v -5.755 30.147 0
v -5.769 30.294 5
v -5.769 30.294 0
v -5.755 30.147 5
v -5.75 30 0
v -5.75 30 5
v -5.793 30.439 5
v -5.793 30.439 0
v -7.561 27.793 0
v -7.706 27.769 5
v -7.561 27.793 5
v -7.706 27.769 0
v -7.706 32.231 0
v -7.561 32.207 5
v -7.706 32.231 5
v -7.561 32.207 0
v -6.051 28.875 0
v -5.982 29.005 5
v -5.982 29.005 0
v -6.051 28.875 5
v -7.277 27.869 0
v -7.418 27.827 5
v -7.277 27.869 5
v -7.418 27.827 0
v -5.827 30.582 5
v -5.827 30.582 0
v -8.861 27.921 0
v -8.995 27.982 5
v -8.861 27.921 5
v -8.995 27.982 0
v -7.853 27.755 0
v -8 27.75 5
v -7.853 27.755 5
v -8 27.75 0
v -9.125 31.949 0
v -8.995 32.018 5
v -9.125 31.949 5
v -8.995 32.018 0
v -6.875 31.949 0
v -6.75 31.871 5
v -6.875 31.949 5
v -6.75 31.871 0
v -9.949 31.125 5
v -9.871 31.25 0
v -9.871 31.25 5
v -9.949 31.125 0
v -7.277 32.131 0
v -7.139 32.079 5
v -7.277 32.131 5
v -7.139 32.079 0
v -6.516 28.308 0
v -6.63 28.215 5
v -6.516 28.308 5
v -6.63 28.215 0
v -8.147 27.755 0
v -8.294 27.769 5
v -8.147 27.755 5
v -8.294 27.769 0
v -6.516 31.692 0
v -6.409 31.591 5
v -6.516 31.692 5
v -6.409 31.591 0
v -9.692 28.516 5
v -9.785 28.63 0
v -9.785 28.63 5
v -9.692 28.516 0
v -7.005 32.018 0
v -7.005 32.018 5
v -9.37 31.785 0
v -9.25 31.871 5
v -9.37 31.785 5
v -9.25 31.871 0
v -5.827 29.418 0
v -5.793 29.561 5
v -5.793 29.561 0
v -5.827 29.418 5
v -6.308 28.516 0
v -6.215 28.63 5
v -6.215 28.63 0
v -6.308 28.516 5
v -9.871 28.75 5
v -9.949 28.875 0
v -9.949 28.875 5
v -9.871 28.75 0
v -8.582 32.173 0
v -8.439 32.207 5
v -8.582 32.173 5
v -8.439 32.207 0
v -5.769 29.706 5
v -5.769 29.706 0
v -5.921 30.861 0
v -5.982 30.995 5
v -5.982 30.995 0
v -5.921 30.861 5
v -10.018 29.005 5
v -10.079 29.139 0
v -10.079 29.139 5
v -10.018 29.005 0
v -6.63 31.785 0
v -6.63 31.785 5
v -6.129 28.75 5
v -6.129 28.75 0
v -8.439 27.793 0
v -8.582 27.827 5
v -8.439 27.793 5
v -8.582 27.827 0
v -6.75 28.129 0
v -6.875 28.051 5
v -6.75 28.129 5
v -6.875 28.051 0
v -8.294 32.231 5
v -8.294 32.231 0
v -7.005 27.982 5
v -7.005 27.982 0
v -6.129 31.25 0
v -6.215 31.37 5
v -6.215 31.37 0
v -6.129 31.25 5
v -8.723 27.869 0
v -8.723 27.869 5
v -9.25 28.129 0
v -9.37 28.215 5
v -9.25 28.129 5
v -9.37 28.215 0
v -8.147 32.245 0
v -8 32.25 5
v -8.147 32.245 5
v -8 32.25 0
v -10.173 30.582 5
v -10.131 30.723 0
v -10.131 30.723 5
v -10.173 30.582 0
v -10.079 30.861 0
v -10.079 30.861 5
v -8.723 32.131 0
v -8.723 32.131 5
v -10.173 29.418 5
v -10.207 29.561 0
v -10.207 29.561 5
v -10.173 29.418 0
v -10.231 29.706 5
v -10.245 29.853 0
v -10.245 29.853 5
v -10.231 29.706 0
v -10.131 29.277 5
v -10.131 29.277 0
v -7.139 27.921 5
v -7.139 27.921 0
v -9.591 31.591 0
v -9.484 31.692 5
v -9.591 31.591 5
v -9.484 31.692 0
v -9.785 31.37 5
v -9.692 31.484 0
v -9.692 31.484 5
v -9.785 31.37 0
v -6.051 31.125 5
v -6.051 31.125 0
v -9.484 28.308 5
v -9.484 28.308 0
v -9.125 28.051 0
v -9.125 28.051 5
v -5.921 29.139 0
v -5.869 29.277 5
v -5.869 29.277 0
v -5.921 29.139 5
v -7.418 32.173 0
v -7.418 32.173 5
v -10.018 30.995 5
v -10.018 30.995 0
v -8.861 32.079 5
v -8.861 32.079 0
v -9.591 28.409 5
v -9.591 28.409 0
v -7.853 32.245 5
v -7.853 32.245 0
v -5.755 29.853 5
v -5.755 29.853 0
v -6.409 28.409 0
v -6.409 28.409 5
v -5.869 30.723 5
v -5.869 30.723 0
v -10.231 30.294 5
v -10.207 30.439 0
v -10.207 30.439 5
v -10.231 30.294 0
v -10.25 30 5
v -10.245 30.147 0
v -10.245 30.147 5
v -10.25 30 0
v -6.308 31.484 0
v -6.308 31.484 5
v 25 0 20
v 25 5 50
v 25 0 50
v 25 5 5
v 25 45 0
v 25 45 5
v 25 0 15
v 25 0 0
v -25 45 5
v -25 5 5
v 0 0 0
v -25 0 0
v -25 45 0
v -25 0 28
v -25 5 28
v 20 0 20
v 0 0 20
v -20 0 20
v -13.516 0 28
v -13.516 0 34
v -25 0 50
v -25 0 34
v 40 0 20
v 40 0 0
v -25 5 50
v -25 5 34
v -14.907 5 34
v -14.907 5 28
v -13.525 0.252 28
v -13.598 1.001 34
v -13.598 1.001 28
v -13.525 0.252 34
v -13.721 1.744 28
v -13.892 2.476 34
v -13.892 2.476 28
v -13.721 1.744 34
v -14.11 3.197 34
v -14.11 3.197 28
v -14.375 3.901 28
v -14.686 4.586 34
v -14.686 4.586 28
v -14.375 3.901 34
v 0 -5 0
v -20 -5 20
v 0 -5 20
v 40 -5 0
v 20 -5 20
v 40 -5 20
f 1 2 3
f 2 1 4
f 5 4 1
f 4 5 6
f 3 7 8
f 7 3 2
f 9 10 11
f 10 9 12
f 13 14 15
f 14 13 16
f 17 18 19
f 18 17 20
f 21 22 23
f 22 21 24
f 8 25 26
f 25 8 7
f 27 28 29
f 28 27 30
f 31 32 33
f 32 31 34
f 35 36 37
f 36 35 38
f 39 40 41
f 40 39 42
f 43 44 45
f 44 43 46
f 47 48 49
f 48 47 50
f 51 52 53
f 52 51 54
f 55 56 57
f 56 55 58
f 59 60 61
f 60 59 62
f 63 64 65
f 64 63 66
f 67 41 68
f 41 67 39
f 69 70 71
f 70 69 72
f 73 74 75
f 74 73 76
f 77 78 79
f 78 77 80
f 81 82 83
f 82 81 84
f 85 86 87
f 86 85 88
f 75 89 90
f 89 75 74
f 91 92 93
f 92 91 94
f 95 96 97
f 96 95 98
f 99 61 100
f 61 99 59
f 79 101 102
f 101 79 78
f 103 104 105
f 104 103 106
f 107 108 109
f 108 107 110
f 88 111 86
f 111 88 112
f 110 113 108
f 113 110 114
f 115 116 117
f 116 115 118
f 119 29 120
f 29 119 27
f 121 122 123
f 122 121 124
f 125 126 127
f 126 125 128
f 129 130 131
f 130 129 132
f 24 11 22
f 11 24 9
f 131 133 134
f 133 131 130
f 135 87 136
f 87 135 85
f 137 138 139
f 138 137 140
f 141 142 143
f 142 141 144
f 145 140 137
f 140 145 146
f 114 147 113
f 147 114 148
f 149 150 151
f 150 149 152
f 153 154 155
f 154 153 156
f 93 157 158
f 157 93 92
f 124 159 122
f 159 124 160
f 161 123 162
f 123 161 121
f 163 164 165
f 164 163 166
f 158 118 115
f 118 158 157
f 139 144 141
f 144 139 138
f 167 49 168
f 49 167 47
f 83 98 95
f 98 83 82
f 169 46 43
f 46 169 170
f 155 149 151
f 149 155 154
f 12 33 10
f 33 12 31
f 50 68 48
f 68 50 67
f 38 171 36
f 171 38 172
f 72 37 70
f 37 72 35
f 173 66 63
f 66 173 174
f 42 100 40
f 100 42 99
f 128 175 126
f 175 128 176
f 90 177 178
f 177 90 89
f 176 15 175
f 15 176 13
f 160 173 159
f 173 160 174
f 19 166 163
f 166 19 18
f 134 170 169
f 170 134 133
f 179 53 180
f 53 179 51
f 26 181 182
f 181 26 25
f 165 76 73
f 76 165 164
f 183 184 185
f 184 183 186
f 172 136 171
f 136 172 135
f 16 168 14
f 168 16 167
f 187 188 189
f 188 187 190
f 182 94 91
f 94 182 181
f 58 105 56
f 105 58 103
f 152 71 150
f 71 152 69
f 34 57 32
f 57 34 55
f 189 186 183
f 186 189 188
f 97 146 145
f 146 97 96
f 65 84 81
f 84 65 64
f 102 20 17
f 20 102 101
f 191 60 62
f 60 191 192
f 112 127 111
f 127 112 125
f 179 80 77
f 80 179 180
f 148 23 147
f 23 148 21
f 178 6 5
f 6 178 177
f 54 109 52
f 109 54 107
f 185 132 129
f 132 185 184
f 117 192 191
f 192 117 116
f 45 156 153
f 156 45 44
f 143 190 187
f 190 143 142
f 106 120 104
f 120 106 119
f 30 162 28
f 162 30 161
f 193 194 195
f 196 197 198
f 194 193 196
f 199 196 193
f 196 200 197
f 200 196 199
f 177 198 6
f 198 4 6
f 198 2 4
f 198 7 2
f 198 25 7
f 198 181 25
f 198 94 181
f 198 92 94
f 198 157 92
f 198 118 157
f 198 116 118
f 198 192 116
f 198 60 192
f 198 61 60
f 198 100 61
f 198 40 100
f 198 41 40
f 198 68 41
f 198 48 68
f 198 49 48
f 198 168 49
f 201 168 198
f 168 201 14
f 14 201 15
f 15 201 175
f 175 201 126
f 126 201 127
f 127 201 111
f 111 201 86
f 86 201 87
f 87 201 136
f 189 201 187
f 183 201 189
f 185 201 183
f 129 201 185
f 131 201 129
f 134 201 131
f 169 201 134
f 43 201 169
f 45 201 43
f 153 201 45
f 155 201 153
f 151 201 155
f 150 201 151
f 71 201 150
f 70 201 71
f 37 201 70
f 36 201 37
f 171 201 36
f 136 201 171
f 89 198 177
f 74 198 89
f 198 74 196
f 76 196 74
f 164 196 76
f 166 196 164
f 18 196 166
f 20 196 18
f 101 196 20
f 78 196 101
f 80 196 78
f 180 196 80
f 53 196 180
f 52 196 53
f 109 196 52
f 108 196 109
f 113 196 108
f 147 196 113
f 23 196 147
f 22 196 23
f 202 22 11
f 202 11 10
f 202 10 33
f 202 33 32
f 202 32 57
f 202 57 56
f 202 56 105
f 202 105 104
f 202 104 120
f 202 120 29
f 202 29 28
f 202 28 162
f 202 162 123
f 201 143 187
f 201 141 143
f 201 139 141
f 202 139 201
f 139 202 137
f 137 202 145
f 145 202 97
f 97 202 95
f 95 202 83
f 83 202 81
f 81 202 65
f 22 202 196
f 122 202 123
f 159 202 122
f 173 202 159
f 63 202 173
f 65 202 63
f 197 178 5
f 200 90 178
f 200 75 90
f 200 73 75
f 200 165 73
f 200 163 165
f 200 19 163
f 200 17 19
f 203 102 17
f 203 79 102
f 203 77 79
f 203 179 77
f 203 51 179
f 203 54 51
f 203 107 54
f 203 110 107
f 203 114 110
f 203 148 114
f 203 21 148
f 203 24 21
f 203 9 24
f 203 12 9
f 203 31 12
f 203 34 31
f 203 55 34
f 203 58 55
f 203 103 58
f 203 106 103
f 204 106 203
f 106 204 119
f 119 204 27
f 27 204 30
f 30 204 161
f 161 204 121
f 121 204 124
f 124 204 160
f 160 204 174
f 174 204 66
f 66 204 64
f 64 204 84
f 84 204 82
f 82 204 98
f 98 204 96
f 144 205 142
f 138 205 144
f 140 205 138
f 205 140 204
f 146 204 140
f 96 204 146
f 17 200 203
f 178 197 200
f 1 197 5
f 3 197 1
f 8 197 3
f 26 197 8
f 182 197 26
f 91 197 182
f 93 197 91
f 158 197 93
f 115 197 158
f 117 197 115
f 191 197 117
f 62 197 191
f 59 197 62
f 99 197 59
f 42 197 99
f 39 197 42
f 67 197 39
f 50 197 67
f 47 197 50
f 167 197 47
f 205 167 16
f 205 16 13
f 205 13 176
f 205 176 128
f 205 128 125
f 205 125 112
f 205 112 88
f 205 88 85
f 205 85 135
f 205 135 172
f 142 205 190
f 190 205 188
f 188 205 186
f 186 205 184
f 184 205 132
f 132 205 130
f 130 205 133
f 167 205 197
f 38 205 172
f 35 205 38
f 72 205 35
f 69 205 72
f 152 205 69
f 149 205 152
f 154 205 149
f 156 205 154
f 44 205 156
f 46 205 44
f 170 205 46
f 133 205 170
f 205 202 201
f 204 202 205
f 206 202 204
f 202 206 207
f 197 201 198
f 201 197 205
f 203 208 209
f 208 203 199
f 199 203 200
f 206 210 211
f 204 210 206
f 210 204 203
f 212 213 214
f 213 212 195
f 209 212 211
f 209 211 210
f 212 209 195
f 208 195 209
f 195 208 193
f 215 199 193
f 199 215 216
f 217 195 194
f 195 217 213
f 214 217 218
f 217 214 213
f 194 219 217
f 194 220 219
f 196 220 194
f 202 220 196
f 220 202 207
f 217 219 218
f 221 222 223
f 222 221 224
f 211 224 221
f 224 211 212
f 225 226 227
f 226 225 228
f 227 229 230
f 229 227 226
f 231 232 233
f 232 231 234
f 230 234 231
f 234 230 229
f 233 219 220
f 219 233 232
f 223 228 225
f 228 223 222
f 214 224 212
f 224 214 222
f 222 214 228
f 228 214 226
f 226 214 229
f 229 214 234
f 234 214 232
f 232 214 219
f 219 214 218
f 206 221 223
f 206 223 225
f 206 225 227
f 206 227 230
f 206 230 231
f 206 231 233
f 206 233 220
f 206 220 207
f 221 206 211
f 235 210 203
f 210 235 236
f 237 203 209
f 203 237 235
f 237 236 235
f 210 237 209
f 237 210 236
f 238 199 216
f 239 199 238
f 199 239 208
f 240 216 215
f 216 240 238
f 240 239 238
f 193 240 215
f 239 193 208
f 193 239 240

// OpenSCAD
// L-shaped mounting bracket for NEMA 17 stepper motor (syringe pump)
// Print orientation: base plate on bed, vertical plate builds upward (+Z)

// ---------------- Parameters ----------------
base_w      = 50;    // base plate length (X)
base_h      = 45;    // base plate width (Y)
base_t      = 5;     // base plate thickness (Z)

hole_m4_x   = -17;   // M4 hole X offset from centre
hole_m4_y   = 30;    // M4 hole Y position
hole_m4_d   = 4.5;   // M4 hole diameter

plate_w     = 50;    // motor plate length (X)
plate_h     = 5;     // motor plate width (Y)
plate_z     = 50;    // motor plate height (Z)

boss_d      = 23;    // motor boss hole diameter
boss_x      = 0;     // boss hole X centre
boss_z      = 28;    // boss hole Z centre

screw_d     = 3.4;   // M3 screw hole diameter
screw_pitch = 31;    // square pattern side length

gusset_t    = 5;     // gusset thickness (X)
gusset_leg  = 20;    // gusset leg length (Y and Z)

eps         = 0.5;   // cutter overshoot

$fn = 96;

// ---------------- Model ----------------
union() {
    // Base plate
    translate([-base_w/2, 0, 0])
        difference() {
            cube([base_w, base_h, base_t]);
            for (sx = [-1, 1])
                translate([sx * hole_m4_x, hole_m4_y, -eps])
                    cylinder(d = hole_m4_d, h = base_t + 2*eps);
        }

    // Motor plate
    translate([-plate_w/2, 0, 0])
        difference() {
            cube([plate_w, plate_h, plate_z]);
            translate([boss_x, -eps, boss_z])
                cylinder(d = boss_d, h = plate_h + 2*eps);
            for (i = [0 : 3])
                for (j = [0 : 3])
                    translate([(i - 1.5) * screw_pitch, (j - 1.5) * screw_pitch, -eps])
                        cylinder(d = screw_d, h = plate_z + 2*eps);
        }

    // Gussets
    for (x0 = [-base_w/2 + gusset_t, base_w/2 - gusset_t])
        translate([x0, 0, 0])
            rotate([90, 0, 0])
                linear_extrude(height = gusset_t)
                    polygon(points = [
                        [gusset_leg, gusset_leg],
                        [gusset_leg, 0],
                        [0, gusset_leg]
                    ]);
}
